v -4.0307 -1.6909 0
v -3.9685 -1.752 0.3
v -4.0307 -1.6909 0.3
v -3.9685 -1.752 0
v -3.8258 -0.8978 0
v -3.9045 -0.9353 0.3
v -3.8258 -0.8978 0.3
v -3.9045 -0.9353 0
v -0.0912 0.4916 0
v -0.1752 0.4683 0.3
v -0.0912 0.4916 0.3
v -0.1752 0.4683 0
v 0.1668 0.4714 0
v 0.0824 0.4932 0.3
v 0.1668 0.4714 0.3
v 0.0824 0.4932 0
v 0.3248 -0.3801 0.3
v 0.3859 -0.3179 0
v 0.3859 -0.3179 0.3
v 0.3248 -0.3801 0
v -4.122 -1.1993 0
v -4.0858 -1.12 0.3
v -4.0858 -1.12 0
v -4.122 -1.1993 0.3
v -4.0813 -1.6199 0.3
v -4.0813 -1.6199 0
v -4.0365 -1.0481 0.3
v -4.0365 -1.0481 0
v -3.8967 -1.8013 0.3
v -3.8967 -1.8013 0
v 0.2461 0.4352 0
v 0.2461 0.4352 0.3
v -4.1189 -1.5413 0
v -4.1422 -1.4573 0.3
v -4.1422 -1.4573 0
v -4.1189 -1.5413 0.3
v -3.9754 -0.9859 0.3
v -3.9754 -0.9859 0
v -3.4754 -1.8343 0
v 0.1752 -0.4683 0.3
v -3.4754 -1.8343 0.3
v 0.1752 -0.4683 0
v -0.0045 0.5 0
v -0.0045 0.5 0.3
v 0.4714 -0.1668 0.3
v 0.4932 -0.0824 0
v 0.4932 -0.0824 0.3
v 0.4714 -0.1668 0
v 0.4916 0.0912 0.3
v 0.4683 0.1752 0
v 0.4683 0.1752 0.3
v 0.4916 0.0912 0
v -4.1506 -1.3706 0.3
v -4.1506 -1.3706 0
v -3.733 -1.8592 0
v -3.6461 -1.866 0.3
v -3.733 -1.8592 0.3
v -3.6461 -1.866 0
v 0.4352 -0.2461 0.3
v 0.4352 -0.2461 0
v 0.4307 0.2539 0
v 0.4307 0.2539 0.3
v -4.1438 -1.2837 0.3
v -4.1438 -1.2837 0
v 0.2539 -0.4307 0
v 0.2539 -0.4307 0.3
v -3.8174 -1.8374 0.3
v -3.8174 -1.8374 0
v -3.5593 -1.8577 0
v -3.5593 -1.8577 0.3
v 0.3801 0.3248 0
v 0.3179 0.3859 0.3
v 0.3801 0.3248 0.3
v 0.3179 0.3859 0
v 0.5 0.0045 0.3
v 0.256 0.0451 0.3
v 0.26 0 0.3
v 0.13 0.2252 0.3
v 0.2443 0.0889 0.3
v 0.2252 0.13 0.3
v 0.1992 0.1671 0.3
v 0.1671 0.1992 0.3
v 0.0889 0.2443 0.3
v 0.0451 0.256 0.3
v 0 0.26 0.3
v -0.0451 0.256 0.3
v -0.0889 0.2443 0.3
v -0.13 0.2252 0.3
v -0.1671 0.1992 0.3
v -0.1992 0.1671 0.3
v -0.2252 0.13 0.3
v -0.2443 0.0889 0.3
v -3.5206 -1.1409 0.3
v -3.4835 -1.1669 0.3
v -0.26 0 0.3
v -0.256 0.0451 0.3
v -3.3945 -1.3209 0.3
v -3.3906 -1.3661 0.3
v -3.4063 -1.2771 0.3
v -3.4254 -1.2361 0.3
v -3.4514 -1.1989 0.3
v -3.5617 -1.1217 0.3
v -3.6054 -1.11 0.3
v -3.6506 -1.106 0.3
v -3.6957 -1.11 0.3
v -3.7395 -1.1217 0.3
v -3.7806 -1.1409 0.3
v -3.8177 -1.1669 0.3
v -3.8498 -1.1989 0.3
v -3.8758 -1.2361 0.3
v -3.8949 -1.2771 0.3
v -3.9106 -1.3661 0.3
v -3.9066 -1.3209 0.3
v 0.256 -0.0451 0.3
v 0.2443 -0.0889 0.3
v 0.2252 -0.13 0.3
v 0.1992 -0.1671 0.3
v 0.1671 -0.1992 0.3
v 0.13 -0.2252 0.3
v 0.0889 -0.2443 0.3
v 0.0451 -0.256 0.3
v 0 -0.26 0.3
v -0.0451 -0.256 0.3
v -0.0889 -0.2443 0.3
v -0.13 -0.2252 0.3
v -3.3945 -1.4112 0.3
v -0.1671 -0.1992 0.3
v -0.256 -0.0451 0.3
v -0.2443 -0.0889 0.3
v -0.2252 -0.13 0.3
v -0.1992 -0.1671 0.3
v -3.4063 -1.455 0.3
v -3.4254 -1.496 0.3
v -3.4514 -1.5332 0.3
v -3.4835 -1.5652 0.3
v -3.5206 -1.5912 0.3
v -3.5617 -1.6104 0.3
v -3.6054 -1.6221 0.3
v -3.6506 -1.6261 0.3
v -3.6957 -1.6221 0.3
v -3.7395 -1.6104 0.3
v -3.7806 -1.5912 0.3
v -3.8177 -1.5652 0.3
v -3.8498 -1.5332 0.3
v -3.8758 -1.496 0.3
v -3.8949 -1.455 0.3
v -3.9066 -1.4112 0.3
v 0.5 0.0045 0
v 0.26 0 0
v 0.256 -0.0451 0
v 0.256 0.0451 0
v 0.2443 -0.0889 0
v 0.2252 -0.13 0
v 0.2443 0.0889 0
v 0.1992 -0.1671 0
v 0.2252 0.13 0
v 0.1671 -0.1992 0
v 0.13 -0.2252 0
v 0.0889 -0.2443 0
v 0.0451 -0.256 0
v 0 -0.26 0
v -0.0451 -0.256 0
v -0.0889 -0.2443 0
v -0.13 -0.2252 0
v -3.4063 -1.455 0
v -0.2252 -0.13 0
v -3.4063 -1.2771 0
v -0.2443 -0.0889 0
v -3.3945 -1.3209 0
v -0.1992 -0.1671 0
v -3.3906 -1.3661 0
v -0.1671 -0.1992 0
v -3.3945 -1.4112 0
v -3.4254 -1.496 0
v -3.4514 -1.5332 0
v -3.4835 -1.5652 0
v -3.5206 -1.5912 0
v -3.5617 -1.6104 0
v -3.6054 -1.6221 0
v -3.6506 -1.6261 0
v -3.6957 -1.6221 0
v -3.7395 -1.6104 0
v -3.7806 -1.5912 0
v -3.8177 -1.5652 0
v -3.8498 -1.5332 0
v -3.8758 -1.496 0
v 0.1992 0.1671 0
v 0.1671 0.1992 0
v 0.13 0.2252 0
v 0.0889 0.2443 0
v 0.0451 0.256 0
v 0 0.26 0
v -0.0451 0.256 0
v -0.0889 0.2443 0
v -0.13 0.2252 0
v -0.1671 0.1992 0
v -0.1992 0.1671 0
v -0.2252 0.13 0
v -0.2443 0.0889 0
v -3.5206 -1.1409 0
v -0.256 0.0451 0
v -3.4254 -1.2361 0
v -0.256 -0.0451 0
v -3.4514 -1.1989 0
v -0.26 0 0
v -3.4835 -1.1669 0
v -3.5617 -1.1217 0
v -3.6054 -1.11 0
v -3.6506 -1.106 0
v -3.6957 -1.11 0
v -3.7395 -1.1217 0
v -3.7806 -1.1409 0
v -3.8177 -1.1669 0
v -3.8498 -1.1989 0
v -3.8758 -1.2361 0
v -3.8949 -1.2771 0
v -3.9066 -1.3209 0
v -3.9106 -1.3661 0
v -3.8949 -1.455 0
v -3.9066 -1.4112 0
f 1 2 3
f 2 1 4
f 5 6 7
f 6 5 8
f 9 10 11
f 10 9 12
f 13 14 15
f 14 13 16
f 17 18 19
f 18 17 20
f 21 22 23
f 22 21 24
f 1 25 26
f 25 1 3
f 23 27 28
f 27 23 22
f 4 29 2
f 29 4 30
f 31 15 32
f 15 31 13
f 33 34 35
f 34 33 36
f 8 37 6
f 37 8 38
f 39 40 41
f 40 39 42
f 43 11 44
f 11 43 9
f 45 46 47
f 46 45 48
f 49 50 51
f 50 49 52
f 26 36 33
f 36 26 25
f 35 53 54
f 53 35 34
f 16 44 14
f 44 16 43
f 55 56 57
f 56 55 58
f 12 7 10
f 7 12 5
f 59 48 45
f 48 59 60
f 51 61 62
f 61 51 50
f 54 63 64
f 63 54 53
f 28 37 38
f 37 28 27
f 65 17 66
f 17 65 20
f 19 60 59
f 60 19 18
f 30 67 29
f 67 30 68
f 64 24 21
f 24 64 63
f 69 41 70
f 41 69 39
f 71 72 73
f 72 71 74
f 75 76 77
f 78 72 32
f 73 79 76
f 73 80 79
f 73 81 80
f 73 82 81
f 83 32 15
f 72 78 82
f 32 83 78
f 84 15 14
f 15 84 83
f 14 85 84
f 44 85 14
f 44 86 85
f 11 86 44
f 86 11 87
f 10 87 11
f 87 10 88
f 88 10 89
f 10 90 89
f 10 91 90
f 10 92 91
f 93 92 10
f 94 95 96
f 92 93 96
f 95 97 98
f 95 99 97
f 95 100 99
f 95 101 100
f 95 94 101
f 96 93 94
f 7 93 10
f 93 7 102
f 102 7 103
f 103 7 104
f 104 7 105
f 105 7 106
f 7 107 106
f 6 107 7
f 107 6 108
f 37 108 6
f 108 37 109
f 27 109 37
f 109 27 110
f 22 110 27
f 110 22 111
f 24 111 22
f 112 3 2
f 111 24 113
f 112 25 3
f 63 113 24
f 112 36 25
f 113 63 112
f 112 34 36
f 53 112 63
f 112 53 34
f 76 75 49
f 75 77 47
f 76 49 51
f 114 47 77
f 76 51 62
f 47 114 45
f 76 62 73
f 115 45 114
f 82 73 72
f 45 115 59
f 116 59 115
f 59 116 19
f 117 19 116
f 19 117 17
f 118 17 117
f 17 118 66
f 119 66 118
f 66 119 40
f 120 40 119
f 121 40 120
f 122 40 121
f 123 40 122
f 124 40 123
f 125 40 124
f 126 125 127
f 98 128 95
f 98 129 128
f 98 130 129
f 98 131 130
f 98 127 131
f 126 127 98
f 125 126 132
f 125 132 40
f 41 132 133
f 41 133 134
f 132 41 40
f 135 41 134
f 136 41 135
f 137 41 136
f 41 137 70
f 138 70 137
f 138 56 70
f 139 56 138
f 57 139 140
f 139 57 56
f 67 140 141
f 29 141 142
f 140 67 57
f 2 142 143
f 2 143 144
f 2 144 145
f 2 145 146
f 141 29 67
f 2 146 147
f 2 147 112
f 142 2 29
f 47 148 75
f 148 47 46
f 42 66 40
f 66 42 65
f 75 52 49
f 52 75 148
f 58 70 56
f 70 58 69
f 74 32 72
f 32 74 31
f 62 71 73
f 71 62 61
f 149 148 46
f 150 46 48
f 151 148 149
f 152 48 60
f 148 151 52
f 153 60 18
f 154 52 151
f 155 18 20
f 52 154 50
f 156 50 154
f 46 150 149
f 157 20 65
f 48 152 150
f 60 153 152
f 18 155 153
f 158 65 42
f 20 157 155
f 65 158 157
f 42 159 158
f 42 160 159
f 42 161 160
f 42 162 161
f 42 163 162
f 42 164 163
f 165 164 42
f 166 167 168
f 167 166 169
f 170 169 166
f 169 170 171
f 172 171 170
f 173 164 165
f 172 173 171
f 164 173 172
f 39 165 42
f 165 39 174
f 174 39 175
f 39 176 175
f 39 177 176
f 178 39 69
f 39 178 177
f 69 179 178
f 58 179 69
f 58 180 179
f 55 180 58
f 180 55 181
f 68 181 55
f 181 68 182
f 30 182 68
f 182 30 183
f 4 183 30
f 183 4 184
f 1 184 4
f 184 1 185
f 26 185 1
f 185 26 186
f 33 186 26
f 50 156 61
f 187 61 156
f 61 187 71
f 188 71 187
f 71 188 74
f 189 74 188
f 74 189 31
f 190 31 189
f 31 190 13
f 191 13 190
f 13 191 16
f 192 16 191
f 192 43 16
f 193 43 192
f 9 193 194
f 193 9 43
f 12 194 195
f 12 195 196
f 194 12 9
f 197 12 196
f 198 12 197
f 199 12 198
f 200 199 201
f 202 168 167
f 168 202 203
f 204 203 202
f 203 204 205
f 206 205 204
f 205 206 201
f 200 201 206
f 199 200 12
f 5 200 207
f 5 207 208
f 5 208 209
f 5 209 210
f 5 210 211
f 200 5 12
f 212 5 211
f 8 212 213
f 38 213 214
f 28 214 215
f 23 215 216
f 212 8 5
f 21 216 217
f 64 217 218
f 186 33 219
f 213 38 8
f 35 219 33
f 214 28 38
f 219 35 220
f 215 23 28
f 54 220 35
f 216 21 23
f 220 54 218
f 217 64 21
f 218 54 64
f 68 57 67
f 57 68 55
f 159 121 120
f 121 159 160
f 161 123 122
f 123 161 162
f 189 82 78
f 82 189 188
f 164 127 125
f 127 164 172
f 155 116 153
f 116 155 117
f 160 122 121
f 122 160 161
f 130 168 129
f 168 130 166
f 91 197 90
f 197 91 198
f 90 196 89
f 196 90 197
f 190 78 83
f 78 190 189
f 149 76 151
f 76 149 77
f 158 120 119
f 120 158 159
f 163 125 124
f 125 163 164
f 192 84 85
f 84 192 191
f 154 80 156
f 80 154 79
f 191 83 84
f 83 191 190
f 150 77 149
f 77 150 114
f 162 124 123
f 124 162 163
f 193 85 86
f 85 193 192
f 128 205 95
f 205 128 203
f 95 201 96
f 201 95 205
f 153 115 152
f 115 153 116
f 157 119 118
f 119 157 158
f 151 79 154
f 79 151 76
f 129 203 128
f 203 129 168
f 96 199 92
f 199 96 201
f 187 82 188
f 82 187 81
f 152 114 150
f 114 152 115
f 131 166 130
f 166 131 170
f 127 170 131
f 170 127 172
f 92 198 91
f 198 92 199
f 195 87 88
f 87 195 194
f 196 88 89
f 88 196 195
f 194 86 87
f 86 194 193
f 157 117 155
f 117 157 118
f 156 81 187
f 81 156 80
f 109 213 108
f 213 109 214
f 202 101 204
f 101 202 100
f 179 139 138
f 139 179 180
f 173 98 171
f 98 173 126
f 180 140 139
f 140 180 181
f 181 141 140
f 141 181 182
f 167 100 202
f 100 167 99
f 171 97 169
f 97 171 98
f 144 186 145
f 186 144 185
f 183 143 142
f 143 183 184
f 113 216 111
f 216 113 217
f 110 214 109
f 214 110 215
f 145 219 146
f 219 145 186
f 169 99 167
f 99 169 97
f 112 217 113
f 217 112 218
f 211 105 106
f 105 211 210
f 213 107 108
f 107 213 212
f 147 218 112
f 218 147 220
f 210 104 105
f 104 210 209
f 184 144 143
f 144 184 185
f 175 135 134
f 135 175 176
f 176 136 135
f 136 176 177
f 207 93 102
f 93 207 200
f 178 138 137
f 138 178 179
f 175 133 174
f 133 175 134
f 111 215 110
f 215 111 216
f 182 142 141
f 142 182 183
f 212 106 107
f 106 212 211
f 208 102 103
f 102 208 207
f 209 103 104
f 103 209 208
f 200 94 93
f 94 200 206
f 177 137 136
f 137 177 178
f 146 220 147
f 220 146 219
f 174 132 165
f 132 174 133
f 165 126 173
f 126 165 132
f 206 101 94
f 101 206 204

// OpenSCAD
difference() {
	linear_extrude(height=0.3) {
		polygon( points=[[0.175234,-0.468287], [0.253889,-0.430744], [0.32483,-0.380113], [0.385901,-0.317932], [0.435246,-0.246091], [0.471367,-0.166772], [0.493166,-0.0823866], [0.49998,0.00450241], [0.491602,0.0912546], [0.468287,0.175234], [0.430744,0.253889], [0.380113,0.32483], [0.317932,0.385901], [0.246091,0.435246], [0.166772,0.471367], [0.0823866,0.493166], [-0.00450241,0.49998], [-0.0912546,0.491602], [-0.175234,0.468287], [-3.82583,-0.897774], [-3.90449,-0.935318], [-3.97543,-0.985949], [-4.0365,-1.04813], [-4.08585,-1.11997], [-4.12197,-1.19929], [-4.14377,-1.28367], [-4.15058,-1.37056], [-4.1422,-1.45732], [-4.11889,-1.5413], [-4.08134,-1.61995], [-4.03071,-1.69089], [-3.96853,-1.75196], [-3.89669,-1.80131], [-3.81737,-1.83743], [-3.73299,-1.85923], [-3.6461,-1.86604], [-3.55935,-1.85766], [-3.47537,-1.83435]]);
	}
	translate([0,0,-0.1]) {
		linear_extrude(height=0.5) {
			polygon( points=[[0.26,0], [0.25605,0.0451485], [0.24432,0.0889252], [0.225167,0.13], [0.199172,0.167125], [0.167125,0.199172], [0.13,0.225167], [0.0889252,0.24432], [0.0451485,0.25605], [4.66673e-10,0.26], [-0.0451485,0.25605], [-0.0889252,0.24432], [-0.13,0.225167], [-0.167125,0.199172], [-0.199172,0.167125], [-0.225167,0.13], [-0.24432,0.0889252], [-0.25605,0.0451485], [-0.26,9.33346e-10], [-0.25605,-0.0451485], [-0.24432,-0.0889252], [-0.225167,-0.13], [-0.199172,-0.167125], [-0.167125,-0.199172], [-0.13,-0.225167], [-0.0889252,-0.24432], [-0.0451485,-0.25605], [-1.40002e-09,-0.26], [0.0451485,-0.25605], [0.0889252,-0.24432], [0.13,-0.225167], [0.167125,-0.199172], [0.199172,-0.167125], [0.225167,-0.13], [0.24432,-0.0889252], [0.25605,-0.0451485]]);
		}
	}
	translate([0,0,-0.1]) {
		linear_extrude(height=0.5) {
			polygon( points=[[-3.3906,-1.36606], [-3.39455,-1.32091], [-3.40628,-1.27714], [-3.42543,-1.23606], [-3.45143,-1.19894], [-3.48348,-1.16689], [-3.5206,-1.14089], [-3.56167,-1.12174], [-3.60545,-1.11001], [-3.6506,-1.10606], [-3.69575,-1.11001], [-3.73953,-1.12174], [-3.7806,-1.14089], [-3.81772,-1.16689], [-3.84977,-1.19894], [-3.87577,-1.23606], [-3.89492,-1.27714], [-3.90665,-1.32091], [-3.9106,-1.36606], [-3.90665,-1.41121], [-3.89492,-1.45499], [-3.87577,-1.49606], [-3.84977,-1.53319], [-3.81772,-1.56523], [-3.7806,-1.59123], [-3.73953,-1.61038], [-3.69575,-1.62211], [-3.6506,-1.62606], [-3.60545,-1.62211], [-3.56167,-1.61038], [-3.5206,-1.59123], [-3.48348,-1.56523], [-3.45143,-1.53319], [-3.42543,-1.49606], [-3.40628,-1.45499], [-3.39455,-1.41121]]);
		}
	}
}
